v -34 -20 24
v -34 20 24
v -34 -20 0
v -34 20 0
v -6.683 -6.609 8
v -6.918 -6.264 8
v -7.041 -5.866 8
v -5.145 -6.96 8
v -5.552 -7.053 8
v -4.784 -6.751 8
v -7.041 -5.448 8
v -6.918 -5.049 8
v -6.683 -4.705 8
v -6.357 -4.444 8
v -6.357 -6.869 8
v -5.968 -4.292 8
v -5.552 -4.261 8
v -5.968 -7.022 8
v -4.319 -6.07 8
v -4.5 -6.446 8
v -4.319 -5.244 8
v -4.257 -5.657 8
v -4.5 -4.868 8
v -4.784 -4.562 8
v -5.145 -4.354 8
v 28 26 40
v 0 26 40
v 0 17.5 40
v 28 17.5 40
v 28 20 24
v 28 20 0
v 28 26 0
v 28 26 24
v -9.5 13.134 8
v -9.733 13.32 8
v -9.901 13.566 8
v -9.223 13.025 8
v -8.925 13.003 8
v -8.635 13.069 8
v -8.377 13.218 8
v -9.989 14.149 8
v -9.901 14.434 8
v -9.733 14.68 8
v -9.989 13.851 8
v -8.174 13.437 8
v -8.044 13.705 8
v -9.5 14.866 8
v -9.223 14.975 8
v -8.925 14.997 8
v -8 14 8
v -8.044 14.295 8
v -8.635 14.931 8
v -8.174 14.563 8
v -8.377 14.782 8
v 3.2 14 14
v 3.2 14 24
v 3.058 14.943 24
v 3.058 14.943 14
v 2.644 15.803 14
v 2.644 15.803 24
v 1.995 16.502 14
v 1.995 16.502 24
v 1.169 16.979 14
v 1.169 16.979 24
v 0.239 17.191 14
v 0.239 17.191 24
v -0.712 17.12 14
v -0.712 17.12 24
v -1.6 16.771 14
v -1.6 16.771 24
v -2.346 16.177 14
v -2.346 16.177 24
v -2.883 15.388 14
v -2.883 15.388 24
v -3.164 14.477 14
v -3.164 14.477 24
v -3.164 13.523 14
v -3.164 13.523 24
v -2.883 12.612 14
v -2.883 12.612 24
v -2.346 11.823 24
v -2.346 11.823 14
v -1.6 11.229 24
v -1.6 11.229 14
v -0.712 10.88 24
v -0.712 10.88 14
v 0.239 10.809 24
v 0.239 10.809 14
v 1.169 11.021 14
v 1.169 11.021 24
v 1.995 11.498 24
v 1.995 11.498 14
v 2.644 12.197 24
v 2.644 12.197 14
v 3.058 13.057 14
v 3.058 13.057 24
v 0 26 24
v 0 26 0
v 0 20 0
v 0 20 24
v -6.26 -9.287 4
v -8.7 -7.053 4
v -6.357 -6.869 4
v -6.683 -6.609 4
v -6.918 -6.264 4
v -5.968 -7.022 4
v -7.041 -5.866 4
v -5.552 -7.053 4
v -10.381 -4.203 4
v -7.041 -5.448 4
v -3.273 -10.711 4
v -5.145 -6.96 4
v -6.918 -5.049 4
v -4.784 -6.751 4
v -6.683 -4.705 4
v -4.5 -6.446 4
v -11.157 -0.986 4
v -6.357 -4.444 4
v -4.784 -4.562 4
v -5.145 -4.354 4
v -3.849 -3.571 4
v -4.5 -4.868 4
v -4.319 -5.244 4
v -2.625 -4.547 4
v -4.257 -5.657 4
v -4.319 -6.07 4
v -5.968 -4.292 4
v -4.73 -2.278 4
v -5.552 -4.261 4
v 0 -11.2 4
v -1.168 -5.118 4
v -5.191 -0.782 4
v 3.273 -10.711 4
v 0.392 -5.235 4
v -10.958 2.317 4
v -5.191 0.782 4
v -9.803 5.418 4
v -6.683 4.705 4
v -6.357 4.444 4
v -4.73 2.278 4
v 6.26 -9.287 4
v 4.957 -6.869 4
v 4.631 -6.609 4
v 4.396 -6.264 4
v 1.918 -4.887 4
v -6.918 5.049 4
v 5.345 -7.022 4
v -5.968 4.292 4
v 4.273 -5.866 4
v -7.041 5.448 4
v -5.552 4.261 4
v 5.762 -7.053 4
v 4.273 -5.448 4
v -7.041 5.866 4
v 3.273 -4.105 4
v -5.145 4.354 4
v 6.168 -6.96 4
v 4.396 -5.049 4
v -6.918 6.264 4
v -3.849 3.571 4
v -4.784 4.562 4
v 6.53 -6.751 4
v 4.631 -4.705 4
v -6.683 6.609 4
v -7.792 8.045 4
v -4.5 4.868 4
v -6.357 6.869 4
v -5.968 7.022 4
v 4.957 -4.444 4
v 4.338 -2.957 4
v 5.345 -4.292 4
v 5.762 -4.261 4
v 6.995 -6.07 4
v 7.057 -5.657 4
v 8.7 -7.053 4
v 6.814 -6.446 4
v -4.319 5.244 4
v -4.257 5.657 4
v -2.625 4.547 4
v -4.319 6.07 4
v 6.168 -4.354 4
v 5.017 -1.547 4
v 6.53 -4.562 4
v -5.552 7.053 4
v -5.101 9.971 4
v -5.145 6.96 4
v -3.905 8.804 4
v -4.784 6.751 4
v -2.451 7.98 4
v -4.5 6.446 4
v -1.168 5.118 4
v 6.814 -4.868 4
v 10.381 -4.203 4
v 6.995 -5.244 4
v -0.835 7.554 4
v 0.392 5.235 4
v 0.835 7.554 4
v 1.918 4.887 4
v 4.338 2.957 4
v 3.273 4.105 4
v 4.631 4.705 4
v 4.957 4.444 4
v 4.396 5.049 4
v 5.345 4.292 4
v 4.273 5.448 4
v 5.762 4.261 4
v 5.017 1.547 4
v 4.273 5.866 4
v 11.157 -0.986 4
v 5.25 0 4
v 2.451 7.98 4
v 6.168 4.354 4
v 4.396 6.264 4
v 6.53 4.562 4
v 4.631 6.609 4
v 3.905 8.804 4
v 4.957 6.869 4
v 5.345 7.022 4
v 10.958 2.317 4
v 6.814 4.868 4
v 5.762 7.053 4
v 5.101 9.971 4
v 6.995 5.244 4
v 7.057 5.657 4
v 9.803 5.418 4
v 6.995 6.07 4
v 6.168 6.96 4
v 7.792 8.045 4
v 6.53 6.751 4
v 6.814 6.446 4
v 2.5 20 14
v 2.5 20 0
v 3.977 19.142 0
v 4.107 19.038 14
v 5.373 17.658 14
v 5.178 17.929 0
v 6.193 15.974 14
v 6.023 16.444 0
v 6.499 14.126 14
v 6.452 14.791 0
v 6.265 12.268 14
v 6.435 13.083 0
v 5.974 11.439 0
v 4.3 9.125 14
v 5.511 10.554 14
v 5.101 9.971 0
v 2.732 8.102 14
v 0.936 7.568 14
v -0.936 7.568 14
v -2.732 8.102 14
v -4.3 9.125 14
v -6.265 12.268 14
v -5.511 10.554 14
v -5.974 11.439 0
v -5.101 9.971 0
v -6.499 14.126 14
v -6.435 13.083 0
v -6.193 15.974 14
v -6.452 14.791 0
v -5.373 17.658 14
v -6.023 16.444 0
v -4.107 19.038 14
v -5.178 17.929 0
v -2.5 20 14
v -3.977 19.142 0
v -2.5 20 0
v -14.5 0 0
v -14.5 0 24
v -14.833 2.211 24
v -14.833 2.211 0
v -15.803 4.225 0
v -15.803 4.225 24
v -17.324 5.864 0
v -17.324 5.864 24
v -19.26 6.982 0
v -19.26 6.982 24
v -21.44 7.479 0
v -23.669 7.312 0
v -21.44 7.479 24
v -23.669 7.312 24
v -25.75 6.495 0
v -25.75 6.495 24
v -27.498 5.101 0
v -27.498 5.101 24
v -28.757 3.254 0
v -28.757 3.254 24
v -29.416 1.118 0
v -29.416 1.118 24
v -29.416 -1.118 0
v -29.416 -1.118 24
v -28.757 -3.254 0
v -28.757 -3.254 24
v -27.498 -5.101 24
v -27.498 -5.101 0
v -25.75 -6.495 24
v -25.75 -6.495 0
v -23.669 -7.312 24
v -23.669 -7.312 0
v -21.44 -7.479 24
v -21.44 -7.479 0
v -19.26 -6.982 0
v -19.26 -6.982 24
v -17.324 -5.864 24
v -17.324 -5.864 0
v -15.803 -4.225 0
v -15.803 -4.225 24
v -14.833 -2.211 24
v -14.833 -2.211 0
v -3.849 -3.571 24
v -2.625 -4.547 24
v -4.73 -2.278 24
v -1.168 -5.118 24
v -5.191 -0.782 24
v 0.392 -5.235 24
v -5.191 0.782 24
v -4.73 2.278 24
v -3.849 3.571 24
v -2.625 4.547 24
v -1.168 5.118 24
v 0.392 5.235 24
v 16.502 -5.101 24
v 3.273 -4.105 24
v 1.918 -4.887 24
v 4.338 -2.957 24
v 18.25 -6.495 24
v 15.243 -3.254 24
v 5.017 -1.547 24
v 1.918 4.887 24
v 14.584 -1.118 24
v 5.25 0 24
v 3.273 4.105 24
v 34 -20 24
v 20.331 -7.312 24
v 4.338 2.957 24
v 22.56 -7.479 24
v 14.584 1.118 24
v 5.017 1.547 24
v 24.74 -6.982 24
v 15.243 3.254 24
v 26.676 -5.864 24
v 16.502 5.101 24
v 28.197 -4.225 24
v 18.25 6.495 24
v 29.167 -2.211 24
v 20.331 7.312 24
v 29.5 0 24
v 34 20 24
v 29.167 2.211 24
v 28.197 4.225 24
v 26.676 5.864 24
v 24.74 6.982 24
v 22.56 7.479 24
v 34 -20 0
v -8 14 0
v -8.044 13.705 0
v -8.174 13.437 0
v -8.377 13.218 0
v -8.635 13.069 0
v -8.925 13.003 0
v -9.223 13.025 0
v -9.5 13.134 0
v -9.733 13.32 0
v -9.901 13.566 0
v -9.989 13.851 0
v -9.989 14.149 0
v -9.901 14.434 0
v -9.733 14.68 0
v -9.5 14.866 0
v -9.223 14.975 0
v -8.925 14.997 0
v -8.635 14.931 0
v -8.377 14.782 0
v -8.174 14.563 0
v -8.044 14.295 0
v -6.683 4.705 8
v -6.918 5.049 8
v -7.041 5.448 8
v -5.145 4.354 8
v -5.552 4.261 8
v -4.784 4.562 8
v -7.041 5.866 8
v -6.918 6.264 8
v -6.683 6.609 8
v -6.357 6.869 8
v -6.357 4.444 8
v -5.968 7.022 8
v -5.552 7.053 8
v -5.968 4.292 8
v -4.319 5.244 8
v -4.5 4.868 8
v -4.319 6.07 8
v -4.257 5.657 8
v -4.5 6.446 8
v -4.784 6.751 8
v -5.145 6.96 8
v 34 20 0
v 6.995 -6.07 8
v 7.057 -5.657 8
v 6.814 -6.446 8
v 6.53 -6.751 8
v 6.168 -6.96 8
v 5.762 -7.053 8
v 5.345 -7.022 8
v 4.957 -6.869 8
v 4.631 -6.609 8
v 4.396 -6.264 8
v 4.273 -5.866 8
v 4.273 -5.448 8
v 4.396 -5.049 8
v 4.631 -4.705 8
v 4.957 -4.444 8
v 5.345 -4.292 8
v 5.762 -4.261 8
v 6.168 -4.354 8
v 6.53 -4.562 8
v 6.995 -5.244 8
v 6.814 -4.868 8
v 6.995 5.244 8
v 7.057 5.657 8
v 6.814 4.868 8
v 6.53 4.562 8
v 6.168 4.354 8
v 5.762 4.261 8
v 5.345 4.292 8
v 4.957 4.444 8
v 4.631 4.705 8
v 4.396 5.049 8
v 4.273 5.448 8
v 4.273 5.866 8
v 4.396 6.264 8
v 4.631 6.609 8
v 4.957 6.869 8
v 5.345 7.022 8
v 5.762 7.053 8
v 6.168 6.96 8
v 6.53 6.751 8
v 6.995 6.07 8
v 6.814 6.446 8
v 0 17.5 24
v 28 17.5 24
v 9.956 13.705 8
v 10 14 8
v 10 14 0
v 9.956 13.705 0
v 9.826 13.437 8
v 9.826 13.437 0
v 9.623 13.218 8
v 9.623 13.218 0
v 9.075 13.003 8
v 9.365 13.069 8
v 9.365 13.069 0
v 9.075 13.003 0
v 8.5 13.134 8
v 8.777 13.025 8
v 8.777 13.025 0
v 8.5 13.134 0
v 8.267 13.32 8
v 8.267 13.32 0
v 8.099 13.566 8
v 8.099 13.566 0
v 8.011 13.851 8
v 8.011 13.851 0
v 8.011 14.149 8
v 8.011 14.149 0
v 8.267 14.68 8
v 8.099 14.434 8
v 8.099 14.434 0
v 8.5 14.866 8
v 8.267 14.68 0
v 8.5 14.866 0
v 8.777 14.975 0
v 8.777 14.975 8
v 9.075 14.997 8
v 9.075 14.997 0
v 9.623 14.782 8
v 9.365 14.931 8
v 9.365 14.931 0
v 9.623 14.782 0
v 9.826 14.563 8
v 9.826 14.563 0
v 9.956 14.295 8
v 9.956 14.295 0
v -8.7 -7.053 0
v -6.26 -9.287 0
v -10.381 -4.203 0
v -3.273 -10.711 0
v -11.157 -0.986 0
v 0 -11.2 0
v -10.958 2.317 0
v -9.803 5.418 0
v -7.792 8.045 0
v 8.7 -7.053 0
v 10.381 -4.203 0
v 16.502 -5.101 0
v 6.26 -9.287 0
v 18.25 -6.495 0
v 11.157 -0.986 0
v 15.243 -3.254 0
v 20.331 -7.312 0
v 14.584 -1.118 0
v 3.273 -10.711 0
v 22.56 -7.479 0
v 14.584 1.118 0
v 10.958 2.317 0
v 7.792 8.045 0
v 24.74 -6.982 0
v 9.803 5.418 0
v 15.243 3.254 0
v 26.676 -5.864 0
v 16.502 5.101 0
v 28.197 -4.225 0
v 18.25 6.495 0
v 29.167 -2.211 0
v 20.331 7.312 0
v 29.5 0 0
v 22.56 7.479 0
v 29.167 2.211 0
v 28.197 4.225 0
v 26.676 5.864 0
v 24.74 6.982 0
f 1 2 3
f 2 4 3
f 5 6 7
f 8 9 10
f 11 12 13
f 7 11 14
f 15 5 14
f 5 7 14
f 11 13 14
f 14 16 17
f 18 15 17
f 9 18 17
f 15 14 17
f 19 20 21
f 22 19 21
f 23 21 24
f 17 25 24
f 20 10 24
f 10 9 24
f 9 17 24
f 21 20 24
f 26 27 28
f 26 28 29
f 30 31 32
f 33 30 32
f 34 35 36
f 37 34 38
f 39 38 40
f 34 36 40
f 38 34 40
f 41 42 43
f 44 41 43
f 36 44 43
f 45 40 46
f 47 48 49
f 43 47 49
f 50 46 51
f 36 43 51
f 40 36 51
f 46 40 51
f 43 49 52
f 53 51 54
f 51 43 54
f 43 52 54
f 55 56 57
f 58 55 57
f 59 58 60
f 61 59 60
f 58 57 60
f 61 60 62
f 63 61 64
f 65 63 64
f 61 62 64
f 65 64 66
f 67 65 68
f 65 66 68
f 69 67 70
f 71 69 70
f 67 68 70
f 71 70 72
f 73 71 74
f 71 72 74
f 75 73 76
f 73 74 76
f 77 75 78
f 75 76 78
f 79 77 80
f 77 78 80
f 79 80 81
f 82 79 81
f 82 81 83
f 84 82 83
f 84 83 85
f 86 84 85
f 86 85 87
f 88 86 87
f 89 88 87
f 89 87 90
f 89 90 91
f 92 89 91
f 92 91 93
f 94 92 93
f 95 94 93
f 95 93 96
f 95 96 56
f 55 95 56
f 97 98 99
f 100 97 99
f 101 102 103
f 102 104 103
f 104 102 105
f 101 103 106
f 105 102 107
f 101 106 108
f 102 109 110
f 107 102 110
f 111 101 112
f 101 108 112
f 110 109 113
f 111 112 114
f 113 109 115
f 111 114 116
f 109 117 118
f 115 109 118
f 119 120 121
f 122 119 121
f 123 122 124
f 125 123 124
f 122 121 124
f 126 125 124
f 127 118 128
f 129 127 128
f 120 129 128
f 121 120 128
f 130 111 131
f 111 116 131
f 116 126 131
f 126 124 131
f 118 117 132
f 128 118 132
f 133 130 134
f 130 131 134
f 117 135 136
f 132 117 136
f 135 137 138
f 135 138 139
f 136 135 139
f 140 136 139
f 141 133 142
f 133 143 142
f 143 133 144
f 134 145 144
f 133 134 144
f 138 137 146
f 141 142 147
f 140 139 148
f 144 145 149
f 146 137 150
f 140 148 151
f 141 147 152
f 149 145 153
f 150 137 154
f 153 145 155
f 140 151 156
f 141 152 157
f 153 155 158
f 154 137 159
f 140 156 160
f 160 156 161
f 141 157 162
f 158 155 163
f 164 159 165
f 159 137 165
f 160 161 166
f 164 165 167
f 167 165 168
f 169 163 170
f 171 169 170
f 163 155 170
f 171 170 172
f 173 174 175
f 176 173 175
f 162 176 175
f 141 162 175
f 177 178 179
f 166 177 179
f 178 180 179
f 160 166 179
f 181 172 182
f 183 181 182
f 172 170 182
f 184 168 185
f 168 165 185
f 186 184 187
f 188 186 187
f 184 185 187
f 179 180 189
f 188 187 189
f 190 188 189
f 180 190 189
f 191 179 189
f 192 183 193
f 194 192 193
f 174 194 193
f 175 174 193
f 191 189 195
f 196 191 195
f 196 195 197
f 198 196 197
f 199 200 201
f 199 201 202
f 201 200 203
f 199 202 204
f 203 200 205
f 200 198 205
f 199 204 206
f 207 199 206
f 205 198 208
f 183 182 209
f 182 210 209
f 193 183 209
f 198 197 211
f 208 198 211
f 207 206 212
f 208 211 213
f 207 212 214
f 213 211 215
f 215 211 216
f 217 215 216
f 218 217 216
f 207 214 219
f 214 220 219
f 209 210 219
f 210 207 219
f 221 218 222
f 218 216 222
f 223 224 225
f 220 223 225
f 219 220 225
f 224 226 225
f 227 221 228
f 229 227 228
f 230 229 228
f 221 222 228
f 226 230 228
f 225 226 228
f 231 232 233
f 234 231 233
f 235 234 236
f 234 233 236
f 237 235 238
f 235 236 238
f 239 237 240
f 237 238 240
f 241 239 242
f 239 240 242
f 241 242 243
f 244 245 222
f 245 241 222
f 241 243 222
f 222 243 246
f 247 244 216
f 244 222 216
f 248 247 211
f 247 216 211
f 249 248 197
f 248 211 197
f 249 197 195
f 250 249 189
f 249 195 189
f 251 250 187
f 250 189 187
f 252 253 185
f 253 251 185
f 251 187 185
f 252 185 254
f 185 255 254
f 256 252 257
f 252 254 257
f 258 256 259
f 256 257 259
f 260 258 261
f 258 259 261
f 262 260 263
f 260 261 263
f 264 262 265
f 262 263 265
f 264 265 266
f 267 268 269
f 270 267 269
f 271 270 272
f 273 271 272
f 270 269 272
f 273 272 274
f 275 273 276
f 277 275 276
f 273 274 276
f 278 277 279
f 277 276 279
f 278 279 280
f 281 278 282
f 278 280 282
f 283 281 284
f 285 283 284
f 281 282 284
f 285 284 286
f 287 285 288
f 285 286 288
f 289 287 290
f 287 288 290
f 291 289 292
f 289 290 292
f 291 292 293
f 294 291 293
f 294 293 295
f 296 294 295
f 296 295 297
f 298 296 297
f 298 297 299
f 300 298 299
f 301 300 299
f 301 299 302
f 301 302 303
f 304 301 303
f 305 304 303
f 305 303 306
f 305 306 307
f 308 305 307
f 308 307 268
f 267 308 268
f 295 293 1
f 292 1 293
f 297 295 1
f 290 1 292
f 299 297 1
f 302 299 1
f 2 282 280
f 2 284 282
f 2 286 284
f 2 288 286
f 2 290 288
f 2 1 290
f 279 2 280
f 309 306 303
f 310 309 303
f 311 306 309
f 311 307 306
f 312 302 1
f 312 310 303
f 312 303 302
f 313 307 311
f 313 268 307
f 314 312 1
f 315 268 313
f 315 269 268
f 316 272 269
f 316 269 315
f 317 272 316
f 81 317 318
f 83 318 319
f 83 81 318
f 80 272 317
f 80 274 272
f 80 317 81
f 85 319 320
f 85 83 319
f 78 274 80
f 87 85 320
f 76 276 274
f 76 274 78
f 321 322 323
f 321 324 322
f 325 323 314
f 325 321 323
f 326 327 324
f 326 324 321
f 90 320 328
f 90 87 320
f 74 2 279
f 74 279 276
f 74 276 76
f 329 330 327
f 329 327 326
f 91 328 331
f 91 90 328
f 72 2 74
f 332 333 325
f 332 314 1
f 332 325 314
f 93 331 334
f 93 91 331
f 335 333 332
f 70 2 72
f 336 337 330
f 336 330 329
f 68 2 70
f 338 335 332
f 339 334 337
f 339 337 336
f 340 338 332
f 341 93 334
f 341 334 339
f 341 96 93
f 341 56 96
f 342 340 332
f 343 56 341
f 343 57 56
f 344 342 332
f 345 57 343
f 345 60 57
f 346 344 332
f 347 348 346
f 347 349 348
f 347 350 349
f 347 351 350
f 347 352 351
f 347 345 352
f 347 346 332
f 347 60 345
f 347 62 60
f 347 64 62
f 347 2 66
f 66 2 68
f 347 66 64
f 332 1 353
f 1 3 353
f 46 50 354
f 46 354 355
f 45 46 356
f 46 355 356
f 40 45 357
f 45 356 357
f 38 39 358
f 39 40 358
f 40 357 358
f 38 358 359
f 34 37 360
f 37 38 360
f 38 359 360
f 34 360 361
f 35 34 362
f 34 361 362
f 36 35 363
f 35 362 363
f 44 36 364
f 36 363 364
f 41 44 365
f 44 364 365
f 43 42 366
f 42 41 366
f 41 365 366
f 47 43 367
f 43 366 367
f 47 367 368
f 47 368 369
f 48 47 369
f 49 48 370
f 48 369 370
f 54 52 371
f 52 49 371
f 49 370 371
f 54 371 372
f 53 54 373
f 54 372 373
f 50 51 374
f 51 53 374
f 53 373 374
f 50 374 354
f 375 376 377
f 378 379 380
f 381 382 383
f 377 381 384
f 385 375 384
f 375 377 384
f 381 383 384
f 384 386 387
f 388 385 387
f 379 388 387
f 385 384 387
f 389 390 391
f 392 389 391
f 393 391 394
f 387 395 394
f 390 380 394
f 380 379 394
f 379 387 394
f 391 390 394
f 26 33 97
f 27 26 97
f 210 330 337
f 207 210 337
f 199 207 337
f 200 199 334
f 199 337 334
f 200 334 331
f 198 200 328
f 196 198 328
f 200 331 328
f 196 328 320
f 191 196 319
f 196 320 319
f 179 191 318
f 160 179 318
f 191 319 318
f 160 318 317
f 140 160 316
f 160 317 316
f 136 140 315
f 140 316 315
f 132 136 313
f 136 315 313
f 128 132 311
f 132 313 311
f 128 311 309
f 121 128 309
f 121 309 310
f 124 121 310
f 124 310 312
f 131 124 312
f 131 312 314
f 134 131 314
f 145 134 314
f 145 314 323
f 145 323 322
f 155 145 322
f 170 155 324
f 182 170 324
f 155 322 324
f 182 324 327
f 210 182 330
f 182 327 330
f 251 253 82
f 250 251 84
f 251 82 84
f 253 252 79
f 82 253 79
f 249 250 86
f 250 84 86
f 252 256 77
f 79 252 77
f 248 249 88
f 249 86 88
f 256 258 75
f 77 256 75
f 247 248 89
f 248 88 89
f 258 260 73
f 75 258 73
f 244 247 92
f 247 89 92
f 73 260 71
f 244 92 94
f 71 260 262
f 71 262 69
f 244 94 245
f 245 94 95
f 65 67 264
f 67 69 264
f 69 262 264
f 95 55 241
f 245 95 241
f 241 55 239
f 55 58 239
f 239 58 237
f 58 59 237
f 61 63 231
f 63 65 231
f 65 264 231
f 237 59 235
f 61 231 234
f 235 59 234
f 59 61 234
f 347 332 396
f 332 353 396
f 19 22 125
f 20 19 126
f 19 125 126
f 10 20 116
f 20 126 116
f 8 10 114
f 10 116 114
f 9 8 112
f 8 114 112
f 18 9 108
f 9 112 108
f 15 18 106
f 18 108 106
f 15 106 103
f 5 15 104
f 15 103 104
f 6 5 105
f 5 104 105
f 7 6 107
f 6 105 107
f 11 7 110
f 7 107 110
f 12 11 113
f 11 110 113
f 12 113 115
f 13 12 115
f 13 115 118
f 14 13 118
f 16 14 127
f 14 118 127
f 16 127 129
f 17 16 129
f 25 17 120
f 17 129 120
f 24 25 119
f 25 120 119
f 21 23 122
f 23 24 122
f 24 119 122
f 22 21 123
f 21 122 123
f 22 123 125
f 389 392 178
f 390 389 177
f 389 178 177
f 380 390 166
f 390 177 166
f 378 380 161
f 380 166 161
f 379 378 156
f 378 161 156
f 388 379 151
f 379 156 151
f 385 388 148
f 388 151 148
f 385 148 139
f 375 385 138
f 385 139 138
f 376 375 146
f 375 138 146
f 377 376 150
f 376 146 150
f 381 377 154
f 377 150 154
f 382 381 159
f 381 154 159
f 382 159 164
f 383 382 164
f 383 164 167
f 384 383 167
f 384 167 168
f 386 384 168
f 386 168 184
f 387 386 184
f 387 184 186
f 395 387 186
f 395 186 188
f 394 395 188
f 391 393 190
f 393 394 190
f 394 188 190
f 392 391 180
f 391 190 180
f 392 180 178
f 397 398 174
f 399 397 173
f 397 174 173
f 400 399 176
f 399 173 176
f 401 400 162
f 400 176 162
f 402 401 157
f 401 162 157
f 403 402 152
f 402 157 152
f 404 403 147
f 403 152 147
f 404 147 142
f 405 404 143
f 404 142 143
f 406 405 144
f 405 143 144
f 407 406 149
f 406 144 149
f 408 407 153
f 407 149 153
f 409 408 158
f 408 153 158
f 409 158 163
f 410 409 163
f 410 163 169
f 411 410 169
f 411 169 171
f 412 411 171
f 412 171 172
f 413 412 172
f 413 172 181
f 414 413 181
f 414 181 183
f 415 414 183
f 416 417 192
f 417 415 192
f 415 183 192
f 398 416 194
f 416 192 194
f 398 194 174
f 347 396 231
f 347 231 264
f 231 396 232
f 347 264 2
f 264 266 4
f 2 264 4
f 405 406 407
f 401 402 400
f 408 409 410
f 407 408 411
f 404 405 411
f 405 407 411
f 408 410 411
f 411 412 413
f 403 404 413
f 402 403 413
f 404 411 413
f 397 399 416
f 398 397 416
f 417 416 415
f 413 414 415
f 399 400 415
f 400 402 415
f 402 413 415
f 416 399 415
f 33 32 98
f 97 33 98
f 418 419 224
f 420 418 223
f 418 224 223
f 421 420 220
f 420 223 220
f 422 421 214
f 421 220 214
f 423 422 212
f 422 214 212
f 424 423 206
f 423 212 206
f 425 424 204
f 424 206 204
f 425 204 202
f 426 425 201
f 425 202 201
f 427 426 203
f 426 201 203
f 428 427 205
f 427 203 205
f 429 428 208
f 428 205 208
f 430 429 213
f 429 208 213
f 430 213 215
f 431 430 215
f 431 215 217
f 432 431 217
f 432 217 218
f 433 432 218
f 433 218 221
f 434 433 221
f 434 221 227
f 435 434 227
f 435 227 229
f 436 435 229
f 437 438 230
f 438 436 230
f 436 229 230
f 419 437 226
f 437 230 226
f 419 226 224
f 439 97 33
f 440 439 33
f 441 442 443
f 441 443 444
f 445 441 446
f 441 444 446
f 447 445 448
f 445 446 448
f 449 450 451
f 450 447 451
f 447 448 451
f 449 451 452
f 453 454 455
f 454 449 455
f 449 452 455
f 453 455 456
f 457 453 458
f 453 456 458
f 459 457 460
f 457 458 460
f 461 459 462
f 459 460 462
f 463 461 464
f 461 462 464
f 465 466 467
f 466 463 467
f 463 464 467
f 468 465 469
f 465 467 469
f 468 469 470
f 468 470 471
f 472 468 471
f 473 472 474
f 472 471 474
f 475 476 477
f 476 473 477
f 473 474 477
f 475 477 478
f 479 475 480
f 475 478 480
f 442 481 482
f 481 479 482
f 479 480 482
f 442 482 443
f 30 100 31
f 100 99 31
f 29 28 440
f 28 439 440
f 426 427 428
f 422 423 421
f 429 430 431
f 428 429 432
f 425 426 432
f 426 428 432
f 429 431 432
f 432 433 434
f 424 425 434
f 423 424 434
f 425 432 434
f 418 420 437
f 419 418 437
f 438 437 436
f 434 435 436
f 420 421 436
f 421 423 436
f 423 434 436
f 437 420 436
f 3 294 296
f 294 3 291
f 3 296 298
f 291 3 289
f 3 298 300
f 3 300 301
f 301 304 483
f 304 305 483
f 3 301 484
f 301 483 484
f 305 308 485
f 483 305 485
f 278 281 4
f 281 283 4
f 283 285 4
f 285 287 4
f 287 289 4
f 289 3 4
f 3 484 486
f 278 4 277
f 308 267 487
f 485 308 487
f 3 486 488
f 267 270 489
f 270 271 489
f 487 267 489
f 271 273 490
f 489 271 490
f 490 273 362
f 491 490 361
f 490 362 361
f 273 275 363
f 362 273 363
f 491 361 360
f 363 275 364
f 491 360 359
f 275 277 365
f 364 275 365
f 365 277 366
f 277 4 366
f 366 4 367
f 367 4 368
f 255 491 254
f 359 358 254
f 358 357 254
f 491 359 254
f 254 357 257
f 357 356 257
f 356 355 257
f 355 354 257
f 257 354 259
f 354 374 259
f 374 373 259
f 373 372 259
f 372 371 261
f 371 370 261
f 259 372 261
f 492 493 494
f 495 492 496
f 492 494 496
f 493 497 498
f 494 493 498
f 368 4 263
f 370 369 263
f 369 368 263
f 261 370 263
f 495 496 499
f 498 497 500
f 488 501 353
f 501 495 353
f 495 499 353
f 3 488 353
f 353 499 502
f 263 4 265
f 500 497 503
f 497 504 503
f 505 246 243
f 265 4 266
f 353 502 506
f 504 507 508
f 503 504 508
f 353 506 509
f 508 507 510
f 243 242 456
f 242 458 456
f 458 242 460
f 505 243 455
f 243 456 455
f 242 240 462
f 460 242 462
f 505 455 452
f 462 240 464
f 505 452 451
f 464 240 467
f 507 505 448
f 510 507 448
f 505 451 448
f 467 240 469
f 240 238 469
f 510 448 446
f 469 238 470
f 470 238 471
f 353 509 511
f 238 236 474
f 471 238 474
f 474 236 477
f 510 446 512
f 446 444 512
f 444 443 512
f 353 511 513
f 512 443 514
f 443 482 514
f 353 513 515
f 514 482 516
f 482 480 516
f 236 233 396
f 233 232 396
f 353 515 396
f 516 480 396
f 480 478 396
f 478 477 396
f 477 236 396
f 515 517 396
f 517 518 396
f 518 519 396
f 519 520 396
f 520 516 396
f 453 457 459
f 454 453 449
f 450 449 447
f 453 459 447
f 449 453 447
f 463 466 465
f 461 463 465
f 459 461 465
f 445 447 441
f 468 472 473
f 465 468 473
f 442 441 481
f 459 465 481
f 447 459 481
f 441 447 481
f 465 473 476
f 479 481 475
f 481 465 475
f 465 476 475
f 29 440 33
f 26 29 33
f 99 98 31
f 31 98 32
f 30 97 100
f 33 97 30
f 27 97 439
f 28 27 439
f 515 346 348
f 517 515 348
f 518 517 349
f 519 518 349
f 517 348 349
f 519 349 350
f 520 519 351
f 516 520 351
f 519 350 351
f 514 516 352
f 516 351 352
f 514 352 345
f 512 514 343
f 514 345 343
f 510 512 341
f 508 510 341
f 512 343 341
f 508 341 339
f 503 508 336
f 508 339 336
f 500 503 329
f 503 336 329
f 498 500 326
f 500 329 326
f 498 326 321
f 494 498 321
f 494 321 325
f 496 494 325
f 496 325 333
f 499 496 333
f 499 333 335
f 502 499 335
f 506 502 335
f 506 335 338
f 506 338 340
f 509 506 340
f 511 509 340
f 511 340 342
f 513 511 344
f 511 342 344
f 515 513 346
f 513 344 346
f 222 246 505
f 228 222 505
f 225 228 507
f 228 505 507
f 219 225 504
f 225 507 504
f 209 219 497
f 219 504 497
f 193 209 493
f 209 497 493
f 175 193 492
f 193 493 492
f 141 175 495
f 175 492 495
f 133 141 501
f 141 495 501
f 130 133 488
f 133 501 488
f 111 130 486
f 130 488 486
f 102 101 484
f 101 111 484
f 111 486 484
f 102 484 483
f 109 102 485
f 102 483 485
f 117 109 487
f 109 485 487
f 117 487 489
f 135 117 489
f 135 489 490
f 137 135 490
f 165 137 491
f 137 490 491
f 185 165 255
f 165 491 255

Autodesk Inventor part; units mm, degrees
ref_plane "YZ Plane" through (0, 0, 0) normal (1, 0, 0) x (0, 1, 0)
sketch "Skizze1" plane through (0, 0, 0) normal (0, 0, 1) x (1, 0, 0)
  line L0 (-34, -20) -> (34, -20)
  line L1 (34, -20) -> (34, 20)
  line L2 (34, 20) -> (-34, 20)
  line L3 (-34, 20) -> (-34, -20)
extrude "Extrusion1" add sketch "Skizze1" along normal blind 24
sketch "Skizze2" plane through (0, 0, 0) normal (0, 0, 1) x (1, 0, 0)
  line L0 (0, 20) -> (28, 20)
  line L1 (28, 20) -> (28, 26)
  line L2 (28, 26) -> (0, 26)
  line L3 (0, 26) -> (0, 20)
extrude "Extrusion2" add sketch "Skizze2" along normal blind 24 separate body
ref_plane "Arbeitsebene1" through (0, 0, 24) normal (0, 0, 1) x (1, 0, 0)
sketch "Skizze3" plane through (0, 0, 24) normal (0, 0, 1) x (1, 0, 0)
  line L0 (0, 17.5) -> (28, 17.5)
  line L1 (28, 17.5) -> (28, 26)
  line L2 (28, 26) -> (0, 26)
  line L3 (0, 26) -> (0, 17.5)
extrude "Extrusion3" add sketch "Skizze3" along normal blind 16 separate body
sketch "Skizze4" plane through (0, 0, 24) normal (0, 0, 1) x (1, 0, 0)
  circle A0 centre (-22, 0) radius 7.5
extrude "Extrusion4" cut sketch "Skizze4" against normal blind 24.2 bodies 1
sketch "Skizze5" plane through (0, 0, 24) normal (0, 0, 1) x (1, 0, 0)
  circle A0 centre (22, 0) radius 7.5
extrude "Extrusion5" cut sketch "Skizze5" against normal blind 24.2 bodies 1
sketch "Skizze6" plane through (0, 0, 24) normal (0, 0, 1) x (1, 0, 0)
  circle A0 centre (0, 0) radius 5.25
extrude "Extrusion6" cut sketch "Skizze6" against normal blind 24.2 bodies 1
sketch "Skizze7" plane through (0, 0, 24) normal (0, 0, 1) x (1, 0, 0)
  circle A0 centre (0, 14) radius 3.2
extrude "Extrusion7" cut sketch "Skizze7" against normal blind 24.2 bodies 1
sketch "Skizze8" plane through (0, 0, 0) normal (0, 0, 1) x (1, 0, 0)
  circle A0 centre (0, 0) radius 11.2
extrude "Extrusion8" cut sketch "Skizze8" along normal blind 4 bodies 1
sketch "Skizze9" plane through (0, 0, 0) normal (0, 0, 1) x (1, 0, 0)
  circle A0 centre (5.6569, 5.6569) radius 1.4
extrude "Extrusion9" cut sketch "Skizze9" along normal blind 8 bodies 1
sketch "Skizze10" plane through (0, 0, 0) normal (0, 0, 1) x (1, 0, 0)
  circle A0 centre (-5.6569, 5.6569) radius 1.4
extrude "Extrusion10" cut sketch "Skizze10" along normal blind 8 bodies 1
sketch "Skizze11" plane through (0, 0, 0) normal (0, 0, 1) x (1, 0, 0)
  circle A0 centre (-5.6569, -5.6569) radius 1.4
extrude "Extrusion11" cut sketch "Skizze11" along normal blind 8 bodies 1
sketch "Skizze12" plane through (0, 0, 0) normal (0, 0, 1) x (1, 0, 0)
  circle A0 centre (5.6569, -5.6569) radius 1.4
extrude "Extrusion12" cut sketch "Skizze12" along normal blind 8 bodies 1
sketch "Skizze13" plane through (0, 0, 0) normal (0, 0, 1) x (1, 0, 0)
  circle A0 centre (0, 14) radius 6.5
extrude "Extrusion13" cut sketch "Skizze13" along normal blind 14 bodies 1
sketch "Skizze14" plane through (0, 0, 0) normal (0, 0, 1) x (1, 0, 0)
  circle A0 centre (-9, 14) radius 1
extrude "Extrusion14" cut sketch "Skizze14" along normal blind 8 bodies 1
sketch "Skizze15" plane through (0, 0, 0) normal (0, 0, 1) x (1, 0, 0)
  circle A0 centre (9, 14) radius 1
extrude "Extrusion15" cut sketch "Skizze15" along normal blind 8 bodies 1
ref_plane "Arbeitsebene2" through (0, 17.5, 0) normal (0, 1, 0) x (-1, 0, 0)
sketch "Skizze16" plane through (0, 17.5, 0) normal (0, 1, 0) x (-1, 0, 0)
  line L0 (1.3, 30) -> (4.5, 30)
  line L1 (4.5, 30) -> (4.5, 38)
  line L2 (4.5, 38) -> (1.3, 38)
  line L3 (1.3, 38) -> (1.3, 30)
extrude "Extrusion16" cut sketch "Skizze16" along normal blind 8.7 bodies 1
sketch "Skizze17" plane through (0, 17.5, 0) normal (0, 1, 0) x (-1, 0, 0)
  line L0 (23.5, 30) -> (26.7, 30)
  line L1 (26.7, 30) -> (26.7, 38)
  line L2 (26.7, 38) -> (23.5, 38)
  line L3 (23.5, 38) -> (23.5, 30)
extrude "Extrusion17" cut sketch "Skizze17" along normal blind 8.7 bodies 1
properties part number "Taster_Schlitten"
